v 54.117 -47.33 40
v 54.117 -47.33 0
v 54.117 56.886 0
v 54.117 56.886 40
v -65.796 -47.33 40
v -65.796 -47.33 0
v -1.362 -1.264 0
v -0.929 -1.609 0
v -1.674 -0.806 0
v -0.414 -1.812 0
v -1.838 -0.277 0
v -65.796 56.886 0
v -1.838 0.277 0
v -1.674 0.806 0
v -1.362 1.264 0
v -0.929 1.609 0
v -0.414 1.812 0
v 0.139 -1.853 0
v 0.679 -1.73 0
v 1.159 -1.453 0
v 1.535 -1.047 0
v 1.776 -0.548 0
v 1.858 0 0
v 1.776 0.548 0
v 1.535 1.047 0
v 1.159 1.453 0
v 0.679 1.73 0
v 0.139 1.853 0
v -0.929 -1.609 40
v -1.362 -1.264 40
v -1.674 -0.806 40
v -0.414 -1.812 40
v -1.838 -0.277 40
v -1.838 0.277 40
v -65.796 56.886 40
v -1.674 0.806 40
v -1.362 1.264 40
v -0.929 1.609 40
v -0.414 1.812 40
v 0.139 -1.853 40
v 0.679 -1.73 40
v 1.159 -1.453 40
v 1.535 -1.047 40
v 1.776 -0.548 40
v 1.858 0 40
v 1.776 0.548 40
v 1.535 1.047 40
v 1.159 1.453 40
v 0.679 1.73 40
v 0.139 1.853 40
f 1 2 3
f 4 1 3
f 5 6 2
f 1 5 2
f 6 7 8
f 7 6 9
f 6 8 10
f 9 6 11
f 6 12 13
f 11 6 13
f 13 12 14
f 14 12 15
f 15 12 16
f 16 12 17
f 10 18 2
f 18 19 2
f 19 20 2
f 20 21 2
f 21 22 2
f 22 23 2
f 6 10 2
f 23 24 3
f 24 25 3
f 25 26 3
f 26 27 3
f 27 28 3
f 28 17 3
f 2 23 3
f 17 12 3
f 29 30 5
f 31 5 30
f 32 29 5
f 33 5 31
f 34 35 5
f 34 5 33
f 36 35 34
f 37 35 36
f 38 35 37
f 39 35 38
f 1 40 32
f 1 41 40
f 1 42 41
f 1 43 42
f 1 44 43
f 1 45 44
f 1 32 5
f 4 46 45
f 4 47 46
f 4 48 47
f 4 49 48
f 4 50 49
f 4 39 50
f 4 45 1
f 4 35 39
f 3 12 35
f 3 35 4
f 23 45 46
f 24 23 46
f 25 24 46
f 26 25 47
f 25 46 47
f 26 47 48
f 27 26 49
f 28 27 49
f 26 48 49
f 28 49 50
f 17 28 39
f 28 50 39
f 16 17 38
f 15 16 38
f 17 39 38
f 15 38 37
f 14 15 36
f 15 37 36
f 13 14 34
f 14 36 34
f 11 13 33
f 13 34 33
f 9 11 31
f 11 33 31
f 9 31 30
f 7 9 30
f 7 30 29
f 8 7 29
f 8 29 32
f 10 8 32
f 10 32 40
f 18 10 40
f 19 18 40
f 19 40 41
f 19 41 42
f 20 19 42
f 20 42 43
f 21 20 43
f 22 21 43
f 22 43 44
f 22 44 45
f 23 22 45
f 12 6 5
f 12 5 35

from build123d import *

# Parameters (mm, degrees)
F0_W          = 119.913816
F0_H          = 104.215179
F1_DEPTH      = 40
F2_R          = 1.858355
F3_DEPTH      = 32.004
F3_DEPTH_BACK = 58.674


with BuildPart() as f1:
    # F0 (on Top) → F1 (new body)
    with BuildSketch(Plane.XY):
        with Locations((-5.839467, 4.778015)):
            Rectangle(F0_W, F0_H)
    extrude(amount=F1_DEPTH)

    # F2 (on face) → F3 (cut, two sides)
    with BuildSketch(Plane.XY.offset(40)) as f3_sk:
        Circle(F2_R)
    extrude(amount=F3_DEPTH, mode=Mode.SUBTRACT)
    extrude(f3_sk.sketch, amount=-F3_DEPTH_BACK, mode=Mode.SUBTRACT)


solid = f1.part
